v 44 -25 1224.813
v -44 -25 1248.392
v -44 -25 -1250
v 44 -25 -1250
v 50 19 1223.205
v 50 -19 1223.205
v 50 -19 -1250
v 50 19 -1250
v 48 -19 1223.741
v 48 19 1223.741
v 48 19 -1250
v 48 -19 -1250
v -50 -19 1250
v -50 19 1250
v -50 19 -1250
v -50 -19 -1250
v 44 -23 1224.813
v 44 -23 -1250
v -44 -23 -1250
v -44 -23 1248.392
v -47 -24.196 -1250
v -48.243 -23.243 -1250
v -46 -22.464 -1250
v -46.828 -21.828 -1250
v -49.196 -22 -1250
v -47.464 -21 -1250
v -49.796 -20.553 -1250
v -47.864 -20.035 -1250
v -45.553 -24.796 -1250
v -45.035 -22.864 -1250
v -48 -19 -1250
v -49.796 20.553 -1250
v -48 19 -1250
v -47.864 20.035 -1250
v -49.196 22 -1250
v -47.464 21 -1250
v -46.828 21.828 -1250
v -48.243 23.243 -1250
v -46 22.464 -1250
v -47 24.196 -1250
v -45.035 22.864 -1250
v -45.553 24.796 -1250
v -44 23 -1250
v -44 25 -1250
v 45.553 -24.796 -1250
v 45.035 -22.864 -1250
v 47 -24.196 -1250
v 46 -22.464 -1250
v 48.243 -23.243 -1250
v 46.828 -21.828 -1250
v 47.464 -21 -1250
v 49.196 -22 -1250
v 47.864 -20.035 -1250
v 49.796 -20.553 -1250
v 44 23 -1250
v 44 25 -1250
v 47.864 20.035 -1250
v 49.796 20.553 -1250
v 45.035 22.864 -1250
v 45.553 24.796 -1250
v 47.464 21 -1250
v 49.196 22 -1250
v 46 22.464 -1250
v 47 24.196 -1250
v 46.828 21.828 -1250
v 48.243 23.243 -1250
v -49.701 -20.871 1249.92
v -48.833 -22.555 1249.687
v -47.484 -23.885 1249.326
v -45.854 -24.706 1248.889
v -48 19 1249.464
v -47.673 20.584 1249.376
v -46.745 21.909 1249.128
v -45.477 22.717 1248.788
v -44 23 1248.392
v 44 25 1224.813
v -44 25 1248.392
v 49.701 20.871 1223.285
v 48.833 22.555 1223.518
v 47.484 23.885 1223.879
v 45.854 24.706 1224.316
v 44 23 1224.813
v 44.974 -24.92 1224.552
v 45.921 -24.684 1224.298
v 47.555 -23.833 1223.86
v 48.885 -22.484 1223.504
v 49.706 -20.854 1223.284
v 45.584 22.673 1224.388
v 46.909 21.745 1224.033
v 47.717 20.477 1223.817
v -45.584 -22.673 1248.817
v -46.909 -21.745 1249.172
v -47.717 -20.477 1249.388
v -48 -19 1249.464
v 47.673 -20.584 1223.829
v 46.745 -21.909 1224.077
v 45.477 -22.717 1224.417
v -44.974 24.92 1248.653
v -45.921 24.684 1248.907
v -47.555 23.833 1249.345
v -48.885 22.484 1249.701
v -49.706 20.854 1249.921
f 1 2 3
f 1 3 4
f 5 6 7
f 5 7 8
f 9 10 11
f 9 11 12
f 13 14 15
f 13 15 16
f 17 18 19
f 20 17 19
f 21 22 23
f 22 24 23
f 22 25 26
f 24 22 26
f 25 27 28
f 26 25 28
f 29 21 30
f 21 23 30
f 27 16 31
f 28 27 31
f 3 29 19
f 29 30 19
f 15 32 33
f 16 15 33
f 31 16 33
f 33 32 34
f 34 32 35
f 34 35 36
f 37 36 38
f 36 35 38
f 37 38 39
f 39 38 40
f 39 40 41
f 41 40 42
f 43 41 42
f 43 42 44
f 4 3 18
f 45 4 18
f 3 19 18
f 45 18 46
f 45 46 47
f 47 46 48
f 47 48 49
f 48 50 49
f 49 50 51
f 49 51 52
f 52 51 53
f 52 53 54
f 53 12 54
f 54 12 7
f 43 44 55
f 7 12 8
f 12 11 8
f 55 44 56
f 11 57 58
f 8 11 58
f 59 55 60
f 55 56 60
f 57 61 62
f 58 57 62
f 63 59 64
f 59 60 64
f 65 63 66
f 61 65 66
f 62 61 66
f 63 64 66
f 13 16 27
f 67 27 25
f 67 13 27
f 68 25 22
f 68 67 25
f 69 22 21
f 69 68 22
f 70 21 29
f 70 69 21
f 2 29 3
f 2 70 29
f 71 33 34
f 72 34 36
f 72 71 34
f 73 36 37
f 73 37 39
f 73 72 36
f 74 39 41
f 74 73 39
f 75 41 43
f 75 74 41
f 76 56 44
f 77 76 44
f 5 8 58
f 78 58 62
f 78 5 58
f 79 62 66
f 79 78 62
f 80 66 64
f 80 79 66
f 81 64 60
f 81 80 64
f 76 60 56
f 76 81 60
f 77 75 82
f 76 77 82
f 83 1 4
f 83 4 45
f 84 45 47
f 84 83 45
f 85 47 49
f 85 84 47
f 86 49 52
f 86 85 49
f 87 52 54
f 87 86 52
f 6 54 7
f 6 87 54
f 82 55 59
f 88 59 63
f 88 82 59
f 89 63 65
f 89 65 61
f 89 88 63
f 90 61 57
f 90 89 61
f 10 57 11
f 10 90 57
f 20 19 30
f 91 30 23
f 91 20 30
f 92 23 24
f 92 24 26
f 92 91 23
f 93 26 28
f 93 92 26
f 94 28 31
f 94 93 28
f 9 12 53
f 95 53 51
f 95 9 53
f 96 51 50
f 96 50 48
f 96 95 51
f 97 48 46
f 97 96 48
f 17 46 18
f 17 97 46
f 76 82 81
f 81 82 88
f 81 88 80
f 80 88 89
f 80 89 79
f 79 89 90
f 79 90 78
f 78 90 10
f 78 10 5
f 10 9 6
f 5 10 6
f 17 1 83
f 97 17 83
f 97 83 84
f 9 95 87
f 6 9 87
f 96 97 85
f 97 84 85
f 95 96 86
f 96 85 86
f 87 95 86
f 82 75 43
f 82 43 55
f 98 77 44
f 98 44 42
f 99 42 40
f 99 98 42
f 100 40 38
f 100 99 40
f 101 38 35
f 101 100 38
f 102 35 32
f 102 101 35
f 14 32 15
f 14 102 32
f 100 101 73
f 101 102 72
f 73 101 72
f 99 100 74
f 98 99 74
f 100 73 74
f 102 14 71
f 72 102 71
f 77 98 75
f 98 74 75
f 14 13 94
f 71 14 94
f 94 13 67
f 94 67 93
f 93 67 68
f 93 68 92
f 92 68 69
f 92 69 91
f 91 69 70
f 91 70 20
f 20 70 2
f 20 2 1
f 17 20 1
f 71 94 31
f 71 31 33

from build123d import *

# Parameters (mm, degrees)
F1_DEPTH = 1250
F3_DEPTH = 50.001


with BuildPart() as f1:
    # F0 (on Top) → F1 (new body, symmetric)
    with BuildSketch(Plane.XY):
        with BuildLine():
            Line((44, 25), (-44, 25))
            ThreePointArc((-44, 25), (-48.2426406871, 23.2426406871), (-50, 19))
            Line((-50, 19), (-50, -19))
            ThreePointArc((-50, -19), (-48.2426406871, -23.2426406871), (-44, -25))
            Line((-44, -25), (44, -25))
            ThreePointArc((44, -25), (48.2426406871, -23.2426406871), (50, -19))
            Line((50, -19), (50, 19))
            ThreePointArc((50, 19), (48.2426406871, 23.2426406871), (44, 25))
        make_face()
        with BuildLine():
            ThreePointArc((-48, 19), (-46.8284271247, 21.8284271247), (-44, 23))
            Line((-44, 23), (44, 23))
            ThreePointArc((44, 23), (46.8284271247, 21.8284271247), (48, 19))
            Line((48, 19), (48, -19))
            ThreePointArc((48, -19), (46.8284271247, -21.8284271247), (44, -23))
            Line((44, -23), (-44, -23))
            ThreePointArc((-44, -23), (-46.8284271247, -21.8284271247), (-48, -19))
            Line((-48, -19), (-48, 19))
        make_face(mode=Mode.SUBTRACT)
    extrude(amount=F1_DEPTH, both=True)

    # F2 (on face) → F3 (cut, through all)
    with BuildSketch(Plane.XZ.offset(25)):
        Polygon((50, 1223.2050807569), (50, 1250), (44, 1250), (44, 1224.8127759115), align=None)
        Polygon((44, 1224.8127759115), (44, 1250), (-44, 1250), (-44, 1248.3923048454), align=None)
        Polygon((-44, 1248.3923048454), (-44, 1250), (-50, 1250), align=None)
    extrude(amount=-F3_DEPTH, mode=Mode.SUBTRACT)


solid = f1.part
